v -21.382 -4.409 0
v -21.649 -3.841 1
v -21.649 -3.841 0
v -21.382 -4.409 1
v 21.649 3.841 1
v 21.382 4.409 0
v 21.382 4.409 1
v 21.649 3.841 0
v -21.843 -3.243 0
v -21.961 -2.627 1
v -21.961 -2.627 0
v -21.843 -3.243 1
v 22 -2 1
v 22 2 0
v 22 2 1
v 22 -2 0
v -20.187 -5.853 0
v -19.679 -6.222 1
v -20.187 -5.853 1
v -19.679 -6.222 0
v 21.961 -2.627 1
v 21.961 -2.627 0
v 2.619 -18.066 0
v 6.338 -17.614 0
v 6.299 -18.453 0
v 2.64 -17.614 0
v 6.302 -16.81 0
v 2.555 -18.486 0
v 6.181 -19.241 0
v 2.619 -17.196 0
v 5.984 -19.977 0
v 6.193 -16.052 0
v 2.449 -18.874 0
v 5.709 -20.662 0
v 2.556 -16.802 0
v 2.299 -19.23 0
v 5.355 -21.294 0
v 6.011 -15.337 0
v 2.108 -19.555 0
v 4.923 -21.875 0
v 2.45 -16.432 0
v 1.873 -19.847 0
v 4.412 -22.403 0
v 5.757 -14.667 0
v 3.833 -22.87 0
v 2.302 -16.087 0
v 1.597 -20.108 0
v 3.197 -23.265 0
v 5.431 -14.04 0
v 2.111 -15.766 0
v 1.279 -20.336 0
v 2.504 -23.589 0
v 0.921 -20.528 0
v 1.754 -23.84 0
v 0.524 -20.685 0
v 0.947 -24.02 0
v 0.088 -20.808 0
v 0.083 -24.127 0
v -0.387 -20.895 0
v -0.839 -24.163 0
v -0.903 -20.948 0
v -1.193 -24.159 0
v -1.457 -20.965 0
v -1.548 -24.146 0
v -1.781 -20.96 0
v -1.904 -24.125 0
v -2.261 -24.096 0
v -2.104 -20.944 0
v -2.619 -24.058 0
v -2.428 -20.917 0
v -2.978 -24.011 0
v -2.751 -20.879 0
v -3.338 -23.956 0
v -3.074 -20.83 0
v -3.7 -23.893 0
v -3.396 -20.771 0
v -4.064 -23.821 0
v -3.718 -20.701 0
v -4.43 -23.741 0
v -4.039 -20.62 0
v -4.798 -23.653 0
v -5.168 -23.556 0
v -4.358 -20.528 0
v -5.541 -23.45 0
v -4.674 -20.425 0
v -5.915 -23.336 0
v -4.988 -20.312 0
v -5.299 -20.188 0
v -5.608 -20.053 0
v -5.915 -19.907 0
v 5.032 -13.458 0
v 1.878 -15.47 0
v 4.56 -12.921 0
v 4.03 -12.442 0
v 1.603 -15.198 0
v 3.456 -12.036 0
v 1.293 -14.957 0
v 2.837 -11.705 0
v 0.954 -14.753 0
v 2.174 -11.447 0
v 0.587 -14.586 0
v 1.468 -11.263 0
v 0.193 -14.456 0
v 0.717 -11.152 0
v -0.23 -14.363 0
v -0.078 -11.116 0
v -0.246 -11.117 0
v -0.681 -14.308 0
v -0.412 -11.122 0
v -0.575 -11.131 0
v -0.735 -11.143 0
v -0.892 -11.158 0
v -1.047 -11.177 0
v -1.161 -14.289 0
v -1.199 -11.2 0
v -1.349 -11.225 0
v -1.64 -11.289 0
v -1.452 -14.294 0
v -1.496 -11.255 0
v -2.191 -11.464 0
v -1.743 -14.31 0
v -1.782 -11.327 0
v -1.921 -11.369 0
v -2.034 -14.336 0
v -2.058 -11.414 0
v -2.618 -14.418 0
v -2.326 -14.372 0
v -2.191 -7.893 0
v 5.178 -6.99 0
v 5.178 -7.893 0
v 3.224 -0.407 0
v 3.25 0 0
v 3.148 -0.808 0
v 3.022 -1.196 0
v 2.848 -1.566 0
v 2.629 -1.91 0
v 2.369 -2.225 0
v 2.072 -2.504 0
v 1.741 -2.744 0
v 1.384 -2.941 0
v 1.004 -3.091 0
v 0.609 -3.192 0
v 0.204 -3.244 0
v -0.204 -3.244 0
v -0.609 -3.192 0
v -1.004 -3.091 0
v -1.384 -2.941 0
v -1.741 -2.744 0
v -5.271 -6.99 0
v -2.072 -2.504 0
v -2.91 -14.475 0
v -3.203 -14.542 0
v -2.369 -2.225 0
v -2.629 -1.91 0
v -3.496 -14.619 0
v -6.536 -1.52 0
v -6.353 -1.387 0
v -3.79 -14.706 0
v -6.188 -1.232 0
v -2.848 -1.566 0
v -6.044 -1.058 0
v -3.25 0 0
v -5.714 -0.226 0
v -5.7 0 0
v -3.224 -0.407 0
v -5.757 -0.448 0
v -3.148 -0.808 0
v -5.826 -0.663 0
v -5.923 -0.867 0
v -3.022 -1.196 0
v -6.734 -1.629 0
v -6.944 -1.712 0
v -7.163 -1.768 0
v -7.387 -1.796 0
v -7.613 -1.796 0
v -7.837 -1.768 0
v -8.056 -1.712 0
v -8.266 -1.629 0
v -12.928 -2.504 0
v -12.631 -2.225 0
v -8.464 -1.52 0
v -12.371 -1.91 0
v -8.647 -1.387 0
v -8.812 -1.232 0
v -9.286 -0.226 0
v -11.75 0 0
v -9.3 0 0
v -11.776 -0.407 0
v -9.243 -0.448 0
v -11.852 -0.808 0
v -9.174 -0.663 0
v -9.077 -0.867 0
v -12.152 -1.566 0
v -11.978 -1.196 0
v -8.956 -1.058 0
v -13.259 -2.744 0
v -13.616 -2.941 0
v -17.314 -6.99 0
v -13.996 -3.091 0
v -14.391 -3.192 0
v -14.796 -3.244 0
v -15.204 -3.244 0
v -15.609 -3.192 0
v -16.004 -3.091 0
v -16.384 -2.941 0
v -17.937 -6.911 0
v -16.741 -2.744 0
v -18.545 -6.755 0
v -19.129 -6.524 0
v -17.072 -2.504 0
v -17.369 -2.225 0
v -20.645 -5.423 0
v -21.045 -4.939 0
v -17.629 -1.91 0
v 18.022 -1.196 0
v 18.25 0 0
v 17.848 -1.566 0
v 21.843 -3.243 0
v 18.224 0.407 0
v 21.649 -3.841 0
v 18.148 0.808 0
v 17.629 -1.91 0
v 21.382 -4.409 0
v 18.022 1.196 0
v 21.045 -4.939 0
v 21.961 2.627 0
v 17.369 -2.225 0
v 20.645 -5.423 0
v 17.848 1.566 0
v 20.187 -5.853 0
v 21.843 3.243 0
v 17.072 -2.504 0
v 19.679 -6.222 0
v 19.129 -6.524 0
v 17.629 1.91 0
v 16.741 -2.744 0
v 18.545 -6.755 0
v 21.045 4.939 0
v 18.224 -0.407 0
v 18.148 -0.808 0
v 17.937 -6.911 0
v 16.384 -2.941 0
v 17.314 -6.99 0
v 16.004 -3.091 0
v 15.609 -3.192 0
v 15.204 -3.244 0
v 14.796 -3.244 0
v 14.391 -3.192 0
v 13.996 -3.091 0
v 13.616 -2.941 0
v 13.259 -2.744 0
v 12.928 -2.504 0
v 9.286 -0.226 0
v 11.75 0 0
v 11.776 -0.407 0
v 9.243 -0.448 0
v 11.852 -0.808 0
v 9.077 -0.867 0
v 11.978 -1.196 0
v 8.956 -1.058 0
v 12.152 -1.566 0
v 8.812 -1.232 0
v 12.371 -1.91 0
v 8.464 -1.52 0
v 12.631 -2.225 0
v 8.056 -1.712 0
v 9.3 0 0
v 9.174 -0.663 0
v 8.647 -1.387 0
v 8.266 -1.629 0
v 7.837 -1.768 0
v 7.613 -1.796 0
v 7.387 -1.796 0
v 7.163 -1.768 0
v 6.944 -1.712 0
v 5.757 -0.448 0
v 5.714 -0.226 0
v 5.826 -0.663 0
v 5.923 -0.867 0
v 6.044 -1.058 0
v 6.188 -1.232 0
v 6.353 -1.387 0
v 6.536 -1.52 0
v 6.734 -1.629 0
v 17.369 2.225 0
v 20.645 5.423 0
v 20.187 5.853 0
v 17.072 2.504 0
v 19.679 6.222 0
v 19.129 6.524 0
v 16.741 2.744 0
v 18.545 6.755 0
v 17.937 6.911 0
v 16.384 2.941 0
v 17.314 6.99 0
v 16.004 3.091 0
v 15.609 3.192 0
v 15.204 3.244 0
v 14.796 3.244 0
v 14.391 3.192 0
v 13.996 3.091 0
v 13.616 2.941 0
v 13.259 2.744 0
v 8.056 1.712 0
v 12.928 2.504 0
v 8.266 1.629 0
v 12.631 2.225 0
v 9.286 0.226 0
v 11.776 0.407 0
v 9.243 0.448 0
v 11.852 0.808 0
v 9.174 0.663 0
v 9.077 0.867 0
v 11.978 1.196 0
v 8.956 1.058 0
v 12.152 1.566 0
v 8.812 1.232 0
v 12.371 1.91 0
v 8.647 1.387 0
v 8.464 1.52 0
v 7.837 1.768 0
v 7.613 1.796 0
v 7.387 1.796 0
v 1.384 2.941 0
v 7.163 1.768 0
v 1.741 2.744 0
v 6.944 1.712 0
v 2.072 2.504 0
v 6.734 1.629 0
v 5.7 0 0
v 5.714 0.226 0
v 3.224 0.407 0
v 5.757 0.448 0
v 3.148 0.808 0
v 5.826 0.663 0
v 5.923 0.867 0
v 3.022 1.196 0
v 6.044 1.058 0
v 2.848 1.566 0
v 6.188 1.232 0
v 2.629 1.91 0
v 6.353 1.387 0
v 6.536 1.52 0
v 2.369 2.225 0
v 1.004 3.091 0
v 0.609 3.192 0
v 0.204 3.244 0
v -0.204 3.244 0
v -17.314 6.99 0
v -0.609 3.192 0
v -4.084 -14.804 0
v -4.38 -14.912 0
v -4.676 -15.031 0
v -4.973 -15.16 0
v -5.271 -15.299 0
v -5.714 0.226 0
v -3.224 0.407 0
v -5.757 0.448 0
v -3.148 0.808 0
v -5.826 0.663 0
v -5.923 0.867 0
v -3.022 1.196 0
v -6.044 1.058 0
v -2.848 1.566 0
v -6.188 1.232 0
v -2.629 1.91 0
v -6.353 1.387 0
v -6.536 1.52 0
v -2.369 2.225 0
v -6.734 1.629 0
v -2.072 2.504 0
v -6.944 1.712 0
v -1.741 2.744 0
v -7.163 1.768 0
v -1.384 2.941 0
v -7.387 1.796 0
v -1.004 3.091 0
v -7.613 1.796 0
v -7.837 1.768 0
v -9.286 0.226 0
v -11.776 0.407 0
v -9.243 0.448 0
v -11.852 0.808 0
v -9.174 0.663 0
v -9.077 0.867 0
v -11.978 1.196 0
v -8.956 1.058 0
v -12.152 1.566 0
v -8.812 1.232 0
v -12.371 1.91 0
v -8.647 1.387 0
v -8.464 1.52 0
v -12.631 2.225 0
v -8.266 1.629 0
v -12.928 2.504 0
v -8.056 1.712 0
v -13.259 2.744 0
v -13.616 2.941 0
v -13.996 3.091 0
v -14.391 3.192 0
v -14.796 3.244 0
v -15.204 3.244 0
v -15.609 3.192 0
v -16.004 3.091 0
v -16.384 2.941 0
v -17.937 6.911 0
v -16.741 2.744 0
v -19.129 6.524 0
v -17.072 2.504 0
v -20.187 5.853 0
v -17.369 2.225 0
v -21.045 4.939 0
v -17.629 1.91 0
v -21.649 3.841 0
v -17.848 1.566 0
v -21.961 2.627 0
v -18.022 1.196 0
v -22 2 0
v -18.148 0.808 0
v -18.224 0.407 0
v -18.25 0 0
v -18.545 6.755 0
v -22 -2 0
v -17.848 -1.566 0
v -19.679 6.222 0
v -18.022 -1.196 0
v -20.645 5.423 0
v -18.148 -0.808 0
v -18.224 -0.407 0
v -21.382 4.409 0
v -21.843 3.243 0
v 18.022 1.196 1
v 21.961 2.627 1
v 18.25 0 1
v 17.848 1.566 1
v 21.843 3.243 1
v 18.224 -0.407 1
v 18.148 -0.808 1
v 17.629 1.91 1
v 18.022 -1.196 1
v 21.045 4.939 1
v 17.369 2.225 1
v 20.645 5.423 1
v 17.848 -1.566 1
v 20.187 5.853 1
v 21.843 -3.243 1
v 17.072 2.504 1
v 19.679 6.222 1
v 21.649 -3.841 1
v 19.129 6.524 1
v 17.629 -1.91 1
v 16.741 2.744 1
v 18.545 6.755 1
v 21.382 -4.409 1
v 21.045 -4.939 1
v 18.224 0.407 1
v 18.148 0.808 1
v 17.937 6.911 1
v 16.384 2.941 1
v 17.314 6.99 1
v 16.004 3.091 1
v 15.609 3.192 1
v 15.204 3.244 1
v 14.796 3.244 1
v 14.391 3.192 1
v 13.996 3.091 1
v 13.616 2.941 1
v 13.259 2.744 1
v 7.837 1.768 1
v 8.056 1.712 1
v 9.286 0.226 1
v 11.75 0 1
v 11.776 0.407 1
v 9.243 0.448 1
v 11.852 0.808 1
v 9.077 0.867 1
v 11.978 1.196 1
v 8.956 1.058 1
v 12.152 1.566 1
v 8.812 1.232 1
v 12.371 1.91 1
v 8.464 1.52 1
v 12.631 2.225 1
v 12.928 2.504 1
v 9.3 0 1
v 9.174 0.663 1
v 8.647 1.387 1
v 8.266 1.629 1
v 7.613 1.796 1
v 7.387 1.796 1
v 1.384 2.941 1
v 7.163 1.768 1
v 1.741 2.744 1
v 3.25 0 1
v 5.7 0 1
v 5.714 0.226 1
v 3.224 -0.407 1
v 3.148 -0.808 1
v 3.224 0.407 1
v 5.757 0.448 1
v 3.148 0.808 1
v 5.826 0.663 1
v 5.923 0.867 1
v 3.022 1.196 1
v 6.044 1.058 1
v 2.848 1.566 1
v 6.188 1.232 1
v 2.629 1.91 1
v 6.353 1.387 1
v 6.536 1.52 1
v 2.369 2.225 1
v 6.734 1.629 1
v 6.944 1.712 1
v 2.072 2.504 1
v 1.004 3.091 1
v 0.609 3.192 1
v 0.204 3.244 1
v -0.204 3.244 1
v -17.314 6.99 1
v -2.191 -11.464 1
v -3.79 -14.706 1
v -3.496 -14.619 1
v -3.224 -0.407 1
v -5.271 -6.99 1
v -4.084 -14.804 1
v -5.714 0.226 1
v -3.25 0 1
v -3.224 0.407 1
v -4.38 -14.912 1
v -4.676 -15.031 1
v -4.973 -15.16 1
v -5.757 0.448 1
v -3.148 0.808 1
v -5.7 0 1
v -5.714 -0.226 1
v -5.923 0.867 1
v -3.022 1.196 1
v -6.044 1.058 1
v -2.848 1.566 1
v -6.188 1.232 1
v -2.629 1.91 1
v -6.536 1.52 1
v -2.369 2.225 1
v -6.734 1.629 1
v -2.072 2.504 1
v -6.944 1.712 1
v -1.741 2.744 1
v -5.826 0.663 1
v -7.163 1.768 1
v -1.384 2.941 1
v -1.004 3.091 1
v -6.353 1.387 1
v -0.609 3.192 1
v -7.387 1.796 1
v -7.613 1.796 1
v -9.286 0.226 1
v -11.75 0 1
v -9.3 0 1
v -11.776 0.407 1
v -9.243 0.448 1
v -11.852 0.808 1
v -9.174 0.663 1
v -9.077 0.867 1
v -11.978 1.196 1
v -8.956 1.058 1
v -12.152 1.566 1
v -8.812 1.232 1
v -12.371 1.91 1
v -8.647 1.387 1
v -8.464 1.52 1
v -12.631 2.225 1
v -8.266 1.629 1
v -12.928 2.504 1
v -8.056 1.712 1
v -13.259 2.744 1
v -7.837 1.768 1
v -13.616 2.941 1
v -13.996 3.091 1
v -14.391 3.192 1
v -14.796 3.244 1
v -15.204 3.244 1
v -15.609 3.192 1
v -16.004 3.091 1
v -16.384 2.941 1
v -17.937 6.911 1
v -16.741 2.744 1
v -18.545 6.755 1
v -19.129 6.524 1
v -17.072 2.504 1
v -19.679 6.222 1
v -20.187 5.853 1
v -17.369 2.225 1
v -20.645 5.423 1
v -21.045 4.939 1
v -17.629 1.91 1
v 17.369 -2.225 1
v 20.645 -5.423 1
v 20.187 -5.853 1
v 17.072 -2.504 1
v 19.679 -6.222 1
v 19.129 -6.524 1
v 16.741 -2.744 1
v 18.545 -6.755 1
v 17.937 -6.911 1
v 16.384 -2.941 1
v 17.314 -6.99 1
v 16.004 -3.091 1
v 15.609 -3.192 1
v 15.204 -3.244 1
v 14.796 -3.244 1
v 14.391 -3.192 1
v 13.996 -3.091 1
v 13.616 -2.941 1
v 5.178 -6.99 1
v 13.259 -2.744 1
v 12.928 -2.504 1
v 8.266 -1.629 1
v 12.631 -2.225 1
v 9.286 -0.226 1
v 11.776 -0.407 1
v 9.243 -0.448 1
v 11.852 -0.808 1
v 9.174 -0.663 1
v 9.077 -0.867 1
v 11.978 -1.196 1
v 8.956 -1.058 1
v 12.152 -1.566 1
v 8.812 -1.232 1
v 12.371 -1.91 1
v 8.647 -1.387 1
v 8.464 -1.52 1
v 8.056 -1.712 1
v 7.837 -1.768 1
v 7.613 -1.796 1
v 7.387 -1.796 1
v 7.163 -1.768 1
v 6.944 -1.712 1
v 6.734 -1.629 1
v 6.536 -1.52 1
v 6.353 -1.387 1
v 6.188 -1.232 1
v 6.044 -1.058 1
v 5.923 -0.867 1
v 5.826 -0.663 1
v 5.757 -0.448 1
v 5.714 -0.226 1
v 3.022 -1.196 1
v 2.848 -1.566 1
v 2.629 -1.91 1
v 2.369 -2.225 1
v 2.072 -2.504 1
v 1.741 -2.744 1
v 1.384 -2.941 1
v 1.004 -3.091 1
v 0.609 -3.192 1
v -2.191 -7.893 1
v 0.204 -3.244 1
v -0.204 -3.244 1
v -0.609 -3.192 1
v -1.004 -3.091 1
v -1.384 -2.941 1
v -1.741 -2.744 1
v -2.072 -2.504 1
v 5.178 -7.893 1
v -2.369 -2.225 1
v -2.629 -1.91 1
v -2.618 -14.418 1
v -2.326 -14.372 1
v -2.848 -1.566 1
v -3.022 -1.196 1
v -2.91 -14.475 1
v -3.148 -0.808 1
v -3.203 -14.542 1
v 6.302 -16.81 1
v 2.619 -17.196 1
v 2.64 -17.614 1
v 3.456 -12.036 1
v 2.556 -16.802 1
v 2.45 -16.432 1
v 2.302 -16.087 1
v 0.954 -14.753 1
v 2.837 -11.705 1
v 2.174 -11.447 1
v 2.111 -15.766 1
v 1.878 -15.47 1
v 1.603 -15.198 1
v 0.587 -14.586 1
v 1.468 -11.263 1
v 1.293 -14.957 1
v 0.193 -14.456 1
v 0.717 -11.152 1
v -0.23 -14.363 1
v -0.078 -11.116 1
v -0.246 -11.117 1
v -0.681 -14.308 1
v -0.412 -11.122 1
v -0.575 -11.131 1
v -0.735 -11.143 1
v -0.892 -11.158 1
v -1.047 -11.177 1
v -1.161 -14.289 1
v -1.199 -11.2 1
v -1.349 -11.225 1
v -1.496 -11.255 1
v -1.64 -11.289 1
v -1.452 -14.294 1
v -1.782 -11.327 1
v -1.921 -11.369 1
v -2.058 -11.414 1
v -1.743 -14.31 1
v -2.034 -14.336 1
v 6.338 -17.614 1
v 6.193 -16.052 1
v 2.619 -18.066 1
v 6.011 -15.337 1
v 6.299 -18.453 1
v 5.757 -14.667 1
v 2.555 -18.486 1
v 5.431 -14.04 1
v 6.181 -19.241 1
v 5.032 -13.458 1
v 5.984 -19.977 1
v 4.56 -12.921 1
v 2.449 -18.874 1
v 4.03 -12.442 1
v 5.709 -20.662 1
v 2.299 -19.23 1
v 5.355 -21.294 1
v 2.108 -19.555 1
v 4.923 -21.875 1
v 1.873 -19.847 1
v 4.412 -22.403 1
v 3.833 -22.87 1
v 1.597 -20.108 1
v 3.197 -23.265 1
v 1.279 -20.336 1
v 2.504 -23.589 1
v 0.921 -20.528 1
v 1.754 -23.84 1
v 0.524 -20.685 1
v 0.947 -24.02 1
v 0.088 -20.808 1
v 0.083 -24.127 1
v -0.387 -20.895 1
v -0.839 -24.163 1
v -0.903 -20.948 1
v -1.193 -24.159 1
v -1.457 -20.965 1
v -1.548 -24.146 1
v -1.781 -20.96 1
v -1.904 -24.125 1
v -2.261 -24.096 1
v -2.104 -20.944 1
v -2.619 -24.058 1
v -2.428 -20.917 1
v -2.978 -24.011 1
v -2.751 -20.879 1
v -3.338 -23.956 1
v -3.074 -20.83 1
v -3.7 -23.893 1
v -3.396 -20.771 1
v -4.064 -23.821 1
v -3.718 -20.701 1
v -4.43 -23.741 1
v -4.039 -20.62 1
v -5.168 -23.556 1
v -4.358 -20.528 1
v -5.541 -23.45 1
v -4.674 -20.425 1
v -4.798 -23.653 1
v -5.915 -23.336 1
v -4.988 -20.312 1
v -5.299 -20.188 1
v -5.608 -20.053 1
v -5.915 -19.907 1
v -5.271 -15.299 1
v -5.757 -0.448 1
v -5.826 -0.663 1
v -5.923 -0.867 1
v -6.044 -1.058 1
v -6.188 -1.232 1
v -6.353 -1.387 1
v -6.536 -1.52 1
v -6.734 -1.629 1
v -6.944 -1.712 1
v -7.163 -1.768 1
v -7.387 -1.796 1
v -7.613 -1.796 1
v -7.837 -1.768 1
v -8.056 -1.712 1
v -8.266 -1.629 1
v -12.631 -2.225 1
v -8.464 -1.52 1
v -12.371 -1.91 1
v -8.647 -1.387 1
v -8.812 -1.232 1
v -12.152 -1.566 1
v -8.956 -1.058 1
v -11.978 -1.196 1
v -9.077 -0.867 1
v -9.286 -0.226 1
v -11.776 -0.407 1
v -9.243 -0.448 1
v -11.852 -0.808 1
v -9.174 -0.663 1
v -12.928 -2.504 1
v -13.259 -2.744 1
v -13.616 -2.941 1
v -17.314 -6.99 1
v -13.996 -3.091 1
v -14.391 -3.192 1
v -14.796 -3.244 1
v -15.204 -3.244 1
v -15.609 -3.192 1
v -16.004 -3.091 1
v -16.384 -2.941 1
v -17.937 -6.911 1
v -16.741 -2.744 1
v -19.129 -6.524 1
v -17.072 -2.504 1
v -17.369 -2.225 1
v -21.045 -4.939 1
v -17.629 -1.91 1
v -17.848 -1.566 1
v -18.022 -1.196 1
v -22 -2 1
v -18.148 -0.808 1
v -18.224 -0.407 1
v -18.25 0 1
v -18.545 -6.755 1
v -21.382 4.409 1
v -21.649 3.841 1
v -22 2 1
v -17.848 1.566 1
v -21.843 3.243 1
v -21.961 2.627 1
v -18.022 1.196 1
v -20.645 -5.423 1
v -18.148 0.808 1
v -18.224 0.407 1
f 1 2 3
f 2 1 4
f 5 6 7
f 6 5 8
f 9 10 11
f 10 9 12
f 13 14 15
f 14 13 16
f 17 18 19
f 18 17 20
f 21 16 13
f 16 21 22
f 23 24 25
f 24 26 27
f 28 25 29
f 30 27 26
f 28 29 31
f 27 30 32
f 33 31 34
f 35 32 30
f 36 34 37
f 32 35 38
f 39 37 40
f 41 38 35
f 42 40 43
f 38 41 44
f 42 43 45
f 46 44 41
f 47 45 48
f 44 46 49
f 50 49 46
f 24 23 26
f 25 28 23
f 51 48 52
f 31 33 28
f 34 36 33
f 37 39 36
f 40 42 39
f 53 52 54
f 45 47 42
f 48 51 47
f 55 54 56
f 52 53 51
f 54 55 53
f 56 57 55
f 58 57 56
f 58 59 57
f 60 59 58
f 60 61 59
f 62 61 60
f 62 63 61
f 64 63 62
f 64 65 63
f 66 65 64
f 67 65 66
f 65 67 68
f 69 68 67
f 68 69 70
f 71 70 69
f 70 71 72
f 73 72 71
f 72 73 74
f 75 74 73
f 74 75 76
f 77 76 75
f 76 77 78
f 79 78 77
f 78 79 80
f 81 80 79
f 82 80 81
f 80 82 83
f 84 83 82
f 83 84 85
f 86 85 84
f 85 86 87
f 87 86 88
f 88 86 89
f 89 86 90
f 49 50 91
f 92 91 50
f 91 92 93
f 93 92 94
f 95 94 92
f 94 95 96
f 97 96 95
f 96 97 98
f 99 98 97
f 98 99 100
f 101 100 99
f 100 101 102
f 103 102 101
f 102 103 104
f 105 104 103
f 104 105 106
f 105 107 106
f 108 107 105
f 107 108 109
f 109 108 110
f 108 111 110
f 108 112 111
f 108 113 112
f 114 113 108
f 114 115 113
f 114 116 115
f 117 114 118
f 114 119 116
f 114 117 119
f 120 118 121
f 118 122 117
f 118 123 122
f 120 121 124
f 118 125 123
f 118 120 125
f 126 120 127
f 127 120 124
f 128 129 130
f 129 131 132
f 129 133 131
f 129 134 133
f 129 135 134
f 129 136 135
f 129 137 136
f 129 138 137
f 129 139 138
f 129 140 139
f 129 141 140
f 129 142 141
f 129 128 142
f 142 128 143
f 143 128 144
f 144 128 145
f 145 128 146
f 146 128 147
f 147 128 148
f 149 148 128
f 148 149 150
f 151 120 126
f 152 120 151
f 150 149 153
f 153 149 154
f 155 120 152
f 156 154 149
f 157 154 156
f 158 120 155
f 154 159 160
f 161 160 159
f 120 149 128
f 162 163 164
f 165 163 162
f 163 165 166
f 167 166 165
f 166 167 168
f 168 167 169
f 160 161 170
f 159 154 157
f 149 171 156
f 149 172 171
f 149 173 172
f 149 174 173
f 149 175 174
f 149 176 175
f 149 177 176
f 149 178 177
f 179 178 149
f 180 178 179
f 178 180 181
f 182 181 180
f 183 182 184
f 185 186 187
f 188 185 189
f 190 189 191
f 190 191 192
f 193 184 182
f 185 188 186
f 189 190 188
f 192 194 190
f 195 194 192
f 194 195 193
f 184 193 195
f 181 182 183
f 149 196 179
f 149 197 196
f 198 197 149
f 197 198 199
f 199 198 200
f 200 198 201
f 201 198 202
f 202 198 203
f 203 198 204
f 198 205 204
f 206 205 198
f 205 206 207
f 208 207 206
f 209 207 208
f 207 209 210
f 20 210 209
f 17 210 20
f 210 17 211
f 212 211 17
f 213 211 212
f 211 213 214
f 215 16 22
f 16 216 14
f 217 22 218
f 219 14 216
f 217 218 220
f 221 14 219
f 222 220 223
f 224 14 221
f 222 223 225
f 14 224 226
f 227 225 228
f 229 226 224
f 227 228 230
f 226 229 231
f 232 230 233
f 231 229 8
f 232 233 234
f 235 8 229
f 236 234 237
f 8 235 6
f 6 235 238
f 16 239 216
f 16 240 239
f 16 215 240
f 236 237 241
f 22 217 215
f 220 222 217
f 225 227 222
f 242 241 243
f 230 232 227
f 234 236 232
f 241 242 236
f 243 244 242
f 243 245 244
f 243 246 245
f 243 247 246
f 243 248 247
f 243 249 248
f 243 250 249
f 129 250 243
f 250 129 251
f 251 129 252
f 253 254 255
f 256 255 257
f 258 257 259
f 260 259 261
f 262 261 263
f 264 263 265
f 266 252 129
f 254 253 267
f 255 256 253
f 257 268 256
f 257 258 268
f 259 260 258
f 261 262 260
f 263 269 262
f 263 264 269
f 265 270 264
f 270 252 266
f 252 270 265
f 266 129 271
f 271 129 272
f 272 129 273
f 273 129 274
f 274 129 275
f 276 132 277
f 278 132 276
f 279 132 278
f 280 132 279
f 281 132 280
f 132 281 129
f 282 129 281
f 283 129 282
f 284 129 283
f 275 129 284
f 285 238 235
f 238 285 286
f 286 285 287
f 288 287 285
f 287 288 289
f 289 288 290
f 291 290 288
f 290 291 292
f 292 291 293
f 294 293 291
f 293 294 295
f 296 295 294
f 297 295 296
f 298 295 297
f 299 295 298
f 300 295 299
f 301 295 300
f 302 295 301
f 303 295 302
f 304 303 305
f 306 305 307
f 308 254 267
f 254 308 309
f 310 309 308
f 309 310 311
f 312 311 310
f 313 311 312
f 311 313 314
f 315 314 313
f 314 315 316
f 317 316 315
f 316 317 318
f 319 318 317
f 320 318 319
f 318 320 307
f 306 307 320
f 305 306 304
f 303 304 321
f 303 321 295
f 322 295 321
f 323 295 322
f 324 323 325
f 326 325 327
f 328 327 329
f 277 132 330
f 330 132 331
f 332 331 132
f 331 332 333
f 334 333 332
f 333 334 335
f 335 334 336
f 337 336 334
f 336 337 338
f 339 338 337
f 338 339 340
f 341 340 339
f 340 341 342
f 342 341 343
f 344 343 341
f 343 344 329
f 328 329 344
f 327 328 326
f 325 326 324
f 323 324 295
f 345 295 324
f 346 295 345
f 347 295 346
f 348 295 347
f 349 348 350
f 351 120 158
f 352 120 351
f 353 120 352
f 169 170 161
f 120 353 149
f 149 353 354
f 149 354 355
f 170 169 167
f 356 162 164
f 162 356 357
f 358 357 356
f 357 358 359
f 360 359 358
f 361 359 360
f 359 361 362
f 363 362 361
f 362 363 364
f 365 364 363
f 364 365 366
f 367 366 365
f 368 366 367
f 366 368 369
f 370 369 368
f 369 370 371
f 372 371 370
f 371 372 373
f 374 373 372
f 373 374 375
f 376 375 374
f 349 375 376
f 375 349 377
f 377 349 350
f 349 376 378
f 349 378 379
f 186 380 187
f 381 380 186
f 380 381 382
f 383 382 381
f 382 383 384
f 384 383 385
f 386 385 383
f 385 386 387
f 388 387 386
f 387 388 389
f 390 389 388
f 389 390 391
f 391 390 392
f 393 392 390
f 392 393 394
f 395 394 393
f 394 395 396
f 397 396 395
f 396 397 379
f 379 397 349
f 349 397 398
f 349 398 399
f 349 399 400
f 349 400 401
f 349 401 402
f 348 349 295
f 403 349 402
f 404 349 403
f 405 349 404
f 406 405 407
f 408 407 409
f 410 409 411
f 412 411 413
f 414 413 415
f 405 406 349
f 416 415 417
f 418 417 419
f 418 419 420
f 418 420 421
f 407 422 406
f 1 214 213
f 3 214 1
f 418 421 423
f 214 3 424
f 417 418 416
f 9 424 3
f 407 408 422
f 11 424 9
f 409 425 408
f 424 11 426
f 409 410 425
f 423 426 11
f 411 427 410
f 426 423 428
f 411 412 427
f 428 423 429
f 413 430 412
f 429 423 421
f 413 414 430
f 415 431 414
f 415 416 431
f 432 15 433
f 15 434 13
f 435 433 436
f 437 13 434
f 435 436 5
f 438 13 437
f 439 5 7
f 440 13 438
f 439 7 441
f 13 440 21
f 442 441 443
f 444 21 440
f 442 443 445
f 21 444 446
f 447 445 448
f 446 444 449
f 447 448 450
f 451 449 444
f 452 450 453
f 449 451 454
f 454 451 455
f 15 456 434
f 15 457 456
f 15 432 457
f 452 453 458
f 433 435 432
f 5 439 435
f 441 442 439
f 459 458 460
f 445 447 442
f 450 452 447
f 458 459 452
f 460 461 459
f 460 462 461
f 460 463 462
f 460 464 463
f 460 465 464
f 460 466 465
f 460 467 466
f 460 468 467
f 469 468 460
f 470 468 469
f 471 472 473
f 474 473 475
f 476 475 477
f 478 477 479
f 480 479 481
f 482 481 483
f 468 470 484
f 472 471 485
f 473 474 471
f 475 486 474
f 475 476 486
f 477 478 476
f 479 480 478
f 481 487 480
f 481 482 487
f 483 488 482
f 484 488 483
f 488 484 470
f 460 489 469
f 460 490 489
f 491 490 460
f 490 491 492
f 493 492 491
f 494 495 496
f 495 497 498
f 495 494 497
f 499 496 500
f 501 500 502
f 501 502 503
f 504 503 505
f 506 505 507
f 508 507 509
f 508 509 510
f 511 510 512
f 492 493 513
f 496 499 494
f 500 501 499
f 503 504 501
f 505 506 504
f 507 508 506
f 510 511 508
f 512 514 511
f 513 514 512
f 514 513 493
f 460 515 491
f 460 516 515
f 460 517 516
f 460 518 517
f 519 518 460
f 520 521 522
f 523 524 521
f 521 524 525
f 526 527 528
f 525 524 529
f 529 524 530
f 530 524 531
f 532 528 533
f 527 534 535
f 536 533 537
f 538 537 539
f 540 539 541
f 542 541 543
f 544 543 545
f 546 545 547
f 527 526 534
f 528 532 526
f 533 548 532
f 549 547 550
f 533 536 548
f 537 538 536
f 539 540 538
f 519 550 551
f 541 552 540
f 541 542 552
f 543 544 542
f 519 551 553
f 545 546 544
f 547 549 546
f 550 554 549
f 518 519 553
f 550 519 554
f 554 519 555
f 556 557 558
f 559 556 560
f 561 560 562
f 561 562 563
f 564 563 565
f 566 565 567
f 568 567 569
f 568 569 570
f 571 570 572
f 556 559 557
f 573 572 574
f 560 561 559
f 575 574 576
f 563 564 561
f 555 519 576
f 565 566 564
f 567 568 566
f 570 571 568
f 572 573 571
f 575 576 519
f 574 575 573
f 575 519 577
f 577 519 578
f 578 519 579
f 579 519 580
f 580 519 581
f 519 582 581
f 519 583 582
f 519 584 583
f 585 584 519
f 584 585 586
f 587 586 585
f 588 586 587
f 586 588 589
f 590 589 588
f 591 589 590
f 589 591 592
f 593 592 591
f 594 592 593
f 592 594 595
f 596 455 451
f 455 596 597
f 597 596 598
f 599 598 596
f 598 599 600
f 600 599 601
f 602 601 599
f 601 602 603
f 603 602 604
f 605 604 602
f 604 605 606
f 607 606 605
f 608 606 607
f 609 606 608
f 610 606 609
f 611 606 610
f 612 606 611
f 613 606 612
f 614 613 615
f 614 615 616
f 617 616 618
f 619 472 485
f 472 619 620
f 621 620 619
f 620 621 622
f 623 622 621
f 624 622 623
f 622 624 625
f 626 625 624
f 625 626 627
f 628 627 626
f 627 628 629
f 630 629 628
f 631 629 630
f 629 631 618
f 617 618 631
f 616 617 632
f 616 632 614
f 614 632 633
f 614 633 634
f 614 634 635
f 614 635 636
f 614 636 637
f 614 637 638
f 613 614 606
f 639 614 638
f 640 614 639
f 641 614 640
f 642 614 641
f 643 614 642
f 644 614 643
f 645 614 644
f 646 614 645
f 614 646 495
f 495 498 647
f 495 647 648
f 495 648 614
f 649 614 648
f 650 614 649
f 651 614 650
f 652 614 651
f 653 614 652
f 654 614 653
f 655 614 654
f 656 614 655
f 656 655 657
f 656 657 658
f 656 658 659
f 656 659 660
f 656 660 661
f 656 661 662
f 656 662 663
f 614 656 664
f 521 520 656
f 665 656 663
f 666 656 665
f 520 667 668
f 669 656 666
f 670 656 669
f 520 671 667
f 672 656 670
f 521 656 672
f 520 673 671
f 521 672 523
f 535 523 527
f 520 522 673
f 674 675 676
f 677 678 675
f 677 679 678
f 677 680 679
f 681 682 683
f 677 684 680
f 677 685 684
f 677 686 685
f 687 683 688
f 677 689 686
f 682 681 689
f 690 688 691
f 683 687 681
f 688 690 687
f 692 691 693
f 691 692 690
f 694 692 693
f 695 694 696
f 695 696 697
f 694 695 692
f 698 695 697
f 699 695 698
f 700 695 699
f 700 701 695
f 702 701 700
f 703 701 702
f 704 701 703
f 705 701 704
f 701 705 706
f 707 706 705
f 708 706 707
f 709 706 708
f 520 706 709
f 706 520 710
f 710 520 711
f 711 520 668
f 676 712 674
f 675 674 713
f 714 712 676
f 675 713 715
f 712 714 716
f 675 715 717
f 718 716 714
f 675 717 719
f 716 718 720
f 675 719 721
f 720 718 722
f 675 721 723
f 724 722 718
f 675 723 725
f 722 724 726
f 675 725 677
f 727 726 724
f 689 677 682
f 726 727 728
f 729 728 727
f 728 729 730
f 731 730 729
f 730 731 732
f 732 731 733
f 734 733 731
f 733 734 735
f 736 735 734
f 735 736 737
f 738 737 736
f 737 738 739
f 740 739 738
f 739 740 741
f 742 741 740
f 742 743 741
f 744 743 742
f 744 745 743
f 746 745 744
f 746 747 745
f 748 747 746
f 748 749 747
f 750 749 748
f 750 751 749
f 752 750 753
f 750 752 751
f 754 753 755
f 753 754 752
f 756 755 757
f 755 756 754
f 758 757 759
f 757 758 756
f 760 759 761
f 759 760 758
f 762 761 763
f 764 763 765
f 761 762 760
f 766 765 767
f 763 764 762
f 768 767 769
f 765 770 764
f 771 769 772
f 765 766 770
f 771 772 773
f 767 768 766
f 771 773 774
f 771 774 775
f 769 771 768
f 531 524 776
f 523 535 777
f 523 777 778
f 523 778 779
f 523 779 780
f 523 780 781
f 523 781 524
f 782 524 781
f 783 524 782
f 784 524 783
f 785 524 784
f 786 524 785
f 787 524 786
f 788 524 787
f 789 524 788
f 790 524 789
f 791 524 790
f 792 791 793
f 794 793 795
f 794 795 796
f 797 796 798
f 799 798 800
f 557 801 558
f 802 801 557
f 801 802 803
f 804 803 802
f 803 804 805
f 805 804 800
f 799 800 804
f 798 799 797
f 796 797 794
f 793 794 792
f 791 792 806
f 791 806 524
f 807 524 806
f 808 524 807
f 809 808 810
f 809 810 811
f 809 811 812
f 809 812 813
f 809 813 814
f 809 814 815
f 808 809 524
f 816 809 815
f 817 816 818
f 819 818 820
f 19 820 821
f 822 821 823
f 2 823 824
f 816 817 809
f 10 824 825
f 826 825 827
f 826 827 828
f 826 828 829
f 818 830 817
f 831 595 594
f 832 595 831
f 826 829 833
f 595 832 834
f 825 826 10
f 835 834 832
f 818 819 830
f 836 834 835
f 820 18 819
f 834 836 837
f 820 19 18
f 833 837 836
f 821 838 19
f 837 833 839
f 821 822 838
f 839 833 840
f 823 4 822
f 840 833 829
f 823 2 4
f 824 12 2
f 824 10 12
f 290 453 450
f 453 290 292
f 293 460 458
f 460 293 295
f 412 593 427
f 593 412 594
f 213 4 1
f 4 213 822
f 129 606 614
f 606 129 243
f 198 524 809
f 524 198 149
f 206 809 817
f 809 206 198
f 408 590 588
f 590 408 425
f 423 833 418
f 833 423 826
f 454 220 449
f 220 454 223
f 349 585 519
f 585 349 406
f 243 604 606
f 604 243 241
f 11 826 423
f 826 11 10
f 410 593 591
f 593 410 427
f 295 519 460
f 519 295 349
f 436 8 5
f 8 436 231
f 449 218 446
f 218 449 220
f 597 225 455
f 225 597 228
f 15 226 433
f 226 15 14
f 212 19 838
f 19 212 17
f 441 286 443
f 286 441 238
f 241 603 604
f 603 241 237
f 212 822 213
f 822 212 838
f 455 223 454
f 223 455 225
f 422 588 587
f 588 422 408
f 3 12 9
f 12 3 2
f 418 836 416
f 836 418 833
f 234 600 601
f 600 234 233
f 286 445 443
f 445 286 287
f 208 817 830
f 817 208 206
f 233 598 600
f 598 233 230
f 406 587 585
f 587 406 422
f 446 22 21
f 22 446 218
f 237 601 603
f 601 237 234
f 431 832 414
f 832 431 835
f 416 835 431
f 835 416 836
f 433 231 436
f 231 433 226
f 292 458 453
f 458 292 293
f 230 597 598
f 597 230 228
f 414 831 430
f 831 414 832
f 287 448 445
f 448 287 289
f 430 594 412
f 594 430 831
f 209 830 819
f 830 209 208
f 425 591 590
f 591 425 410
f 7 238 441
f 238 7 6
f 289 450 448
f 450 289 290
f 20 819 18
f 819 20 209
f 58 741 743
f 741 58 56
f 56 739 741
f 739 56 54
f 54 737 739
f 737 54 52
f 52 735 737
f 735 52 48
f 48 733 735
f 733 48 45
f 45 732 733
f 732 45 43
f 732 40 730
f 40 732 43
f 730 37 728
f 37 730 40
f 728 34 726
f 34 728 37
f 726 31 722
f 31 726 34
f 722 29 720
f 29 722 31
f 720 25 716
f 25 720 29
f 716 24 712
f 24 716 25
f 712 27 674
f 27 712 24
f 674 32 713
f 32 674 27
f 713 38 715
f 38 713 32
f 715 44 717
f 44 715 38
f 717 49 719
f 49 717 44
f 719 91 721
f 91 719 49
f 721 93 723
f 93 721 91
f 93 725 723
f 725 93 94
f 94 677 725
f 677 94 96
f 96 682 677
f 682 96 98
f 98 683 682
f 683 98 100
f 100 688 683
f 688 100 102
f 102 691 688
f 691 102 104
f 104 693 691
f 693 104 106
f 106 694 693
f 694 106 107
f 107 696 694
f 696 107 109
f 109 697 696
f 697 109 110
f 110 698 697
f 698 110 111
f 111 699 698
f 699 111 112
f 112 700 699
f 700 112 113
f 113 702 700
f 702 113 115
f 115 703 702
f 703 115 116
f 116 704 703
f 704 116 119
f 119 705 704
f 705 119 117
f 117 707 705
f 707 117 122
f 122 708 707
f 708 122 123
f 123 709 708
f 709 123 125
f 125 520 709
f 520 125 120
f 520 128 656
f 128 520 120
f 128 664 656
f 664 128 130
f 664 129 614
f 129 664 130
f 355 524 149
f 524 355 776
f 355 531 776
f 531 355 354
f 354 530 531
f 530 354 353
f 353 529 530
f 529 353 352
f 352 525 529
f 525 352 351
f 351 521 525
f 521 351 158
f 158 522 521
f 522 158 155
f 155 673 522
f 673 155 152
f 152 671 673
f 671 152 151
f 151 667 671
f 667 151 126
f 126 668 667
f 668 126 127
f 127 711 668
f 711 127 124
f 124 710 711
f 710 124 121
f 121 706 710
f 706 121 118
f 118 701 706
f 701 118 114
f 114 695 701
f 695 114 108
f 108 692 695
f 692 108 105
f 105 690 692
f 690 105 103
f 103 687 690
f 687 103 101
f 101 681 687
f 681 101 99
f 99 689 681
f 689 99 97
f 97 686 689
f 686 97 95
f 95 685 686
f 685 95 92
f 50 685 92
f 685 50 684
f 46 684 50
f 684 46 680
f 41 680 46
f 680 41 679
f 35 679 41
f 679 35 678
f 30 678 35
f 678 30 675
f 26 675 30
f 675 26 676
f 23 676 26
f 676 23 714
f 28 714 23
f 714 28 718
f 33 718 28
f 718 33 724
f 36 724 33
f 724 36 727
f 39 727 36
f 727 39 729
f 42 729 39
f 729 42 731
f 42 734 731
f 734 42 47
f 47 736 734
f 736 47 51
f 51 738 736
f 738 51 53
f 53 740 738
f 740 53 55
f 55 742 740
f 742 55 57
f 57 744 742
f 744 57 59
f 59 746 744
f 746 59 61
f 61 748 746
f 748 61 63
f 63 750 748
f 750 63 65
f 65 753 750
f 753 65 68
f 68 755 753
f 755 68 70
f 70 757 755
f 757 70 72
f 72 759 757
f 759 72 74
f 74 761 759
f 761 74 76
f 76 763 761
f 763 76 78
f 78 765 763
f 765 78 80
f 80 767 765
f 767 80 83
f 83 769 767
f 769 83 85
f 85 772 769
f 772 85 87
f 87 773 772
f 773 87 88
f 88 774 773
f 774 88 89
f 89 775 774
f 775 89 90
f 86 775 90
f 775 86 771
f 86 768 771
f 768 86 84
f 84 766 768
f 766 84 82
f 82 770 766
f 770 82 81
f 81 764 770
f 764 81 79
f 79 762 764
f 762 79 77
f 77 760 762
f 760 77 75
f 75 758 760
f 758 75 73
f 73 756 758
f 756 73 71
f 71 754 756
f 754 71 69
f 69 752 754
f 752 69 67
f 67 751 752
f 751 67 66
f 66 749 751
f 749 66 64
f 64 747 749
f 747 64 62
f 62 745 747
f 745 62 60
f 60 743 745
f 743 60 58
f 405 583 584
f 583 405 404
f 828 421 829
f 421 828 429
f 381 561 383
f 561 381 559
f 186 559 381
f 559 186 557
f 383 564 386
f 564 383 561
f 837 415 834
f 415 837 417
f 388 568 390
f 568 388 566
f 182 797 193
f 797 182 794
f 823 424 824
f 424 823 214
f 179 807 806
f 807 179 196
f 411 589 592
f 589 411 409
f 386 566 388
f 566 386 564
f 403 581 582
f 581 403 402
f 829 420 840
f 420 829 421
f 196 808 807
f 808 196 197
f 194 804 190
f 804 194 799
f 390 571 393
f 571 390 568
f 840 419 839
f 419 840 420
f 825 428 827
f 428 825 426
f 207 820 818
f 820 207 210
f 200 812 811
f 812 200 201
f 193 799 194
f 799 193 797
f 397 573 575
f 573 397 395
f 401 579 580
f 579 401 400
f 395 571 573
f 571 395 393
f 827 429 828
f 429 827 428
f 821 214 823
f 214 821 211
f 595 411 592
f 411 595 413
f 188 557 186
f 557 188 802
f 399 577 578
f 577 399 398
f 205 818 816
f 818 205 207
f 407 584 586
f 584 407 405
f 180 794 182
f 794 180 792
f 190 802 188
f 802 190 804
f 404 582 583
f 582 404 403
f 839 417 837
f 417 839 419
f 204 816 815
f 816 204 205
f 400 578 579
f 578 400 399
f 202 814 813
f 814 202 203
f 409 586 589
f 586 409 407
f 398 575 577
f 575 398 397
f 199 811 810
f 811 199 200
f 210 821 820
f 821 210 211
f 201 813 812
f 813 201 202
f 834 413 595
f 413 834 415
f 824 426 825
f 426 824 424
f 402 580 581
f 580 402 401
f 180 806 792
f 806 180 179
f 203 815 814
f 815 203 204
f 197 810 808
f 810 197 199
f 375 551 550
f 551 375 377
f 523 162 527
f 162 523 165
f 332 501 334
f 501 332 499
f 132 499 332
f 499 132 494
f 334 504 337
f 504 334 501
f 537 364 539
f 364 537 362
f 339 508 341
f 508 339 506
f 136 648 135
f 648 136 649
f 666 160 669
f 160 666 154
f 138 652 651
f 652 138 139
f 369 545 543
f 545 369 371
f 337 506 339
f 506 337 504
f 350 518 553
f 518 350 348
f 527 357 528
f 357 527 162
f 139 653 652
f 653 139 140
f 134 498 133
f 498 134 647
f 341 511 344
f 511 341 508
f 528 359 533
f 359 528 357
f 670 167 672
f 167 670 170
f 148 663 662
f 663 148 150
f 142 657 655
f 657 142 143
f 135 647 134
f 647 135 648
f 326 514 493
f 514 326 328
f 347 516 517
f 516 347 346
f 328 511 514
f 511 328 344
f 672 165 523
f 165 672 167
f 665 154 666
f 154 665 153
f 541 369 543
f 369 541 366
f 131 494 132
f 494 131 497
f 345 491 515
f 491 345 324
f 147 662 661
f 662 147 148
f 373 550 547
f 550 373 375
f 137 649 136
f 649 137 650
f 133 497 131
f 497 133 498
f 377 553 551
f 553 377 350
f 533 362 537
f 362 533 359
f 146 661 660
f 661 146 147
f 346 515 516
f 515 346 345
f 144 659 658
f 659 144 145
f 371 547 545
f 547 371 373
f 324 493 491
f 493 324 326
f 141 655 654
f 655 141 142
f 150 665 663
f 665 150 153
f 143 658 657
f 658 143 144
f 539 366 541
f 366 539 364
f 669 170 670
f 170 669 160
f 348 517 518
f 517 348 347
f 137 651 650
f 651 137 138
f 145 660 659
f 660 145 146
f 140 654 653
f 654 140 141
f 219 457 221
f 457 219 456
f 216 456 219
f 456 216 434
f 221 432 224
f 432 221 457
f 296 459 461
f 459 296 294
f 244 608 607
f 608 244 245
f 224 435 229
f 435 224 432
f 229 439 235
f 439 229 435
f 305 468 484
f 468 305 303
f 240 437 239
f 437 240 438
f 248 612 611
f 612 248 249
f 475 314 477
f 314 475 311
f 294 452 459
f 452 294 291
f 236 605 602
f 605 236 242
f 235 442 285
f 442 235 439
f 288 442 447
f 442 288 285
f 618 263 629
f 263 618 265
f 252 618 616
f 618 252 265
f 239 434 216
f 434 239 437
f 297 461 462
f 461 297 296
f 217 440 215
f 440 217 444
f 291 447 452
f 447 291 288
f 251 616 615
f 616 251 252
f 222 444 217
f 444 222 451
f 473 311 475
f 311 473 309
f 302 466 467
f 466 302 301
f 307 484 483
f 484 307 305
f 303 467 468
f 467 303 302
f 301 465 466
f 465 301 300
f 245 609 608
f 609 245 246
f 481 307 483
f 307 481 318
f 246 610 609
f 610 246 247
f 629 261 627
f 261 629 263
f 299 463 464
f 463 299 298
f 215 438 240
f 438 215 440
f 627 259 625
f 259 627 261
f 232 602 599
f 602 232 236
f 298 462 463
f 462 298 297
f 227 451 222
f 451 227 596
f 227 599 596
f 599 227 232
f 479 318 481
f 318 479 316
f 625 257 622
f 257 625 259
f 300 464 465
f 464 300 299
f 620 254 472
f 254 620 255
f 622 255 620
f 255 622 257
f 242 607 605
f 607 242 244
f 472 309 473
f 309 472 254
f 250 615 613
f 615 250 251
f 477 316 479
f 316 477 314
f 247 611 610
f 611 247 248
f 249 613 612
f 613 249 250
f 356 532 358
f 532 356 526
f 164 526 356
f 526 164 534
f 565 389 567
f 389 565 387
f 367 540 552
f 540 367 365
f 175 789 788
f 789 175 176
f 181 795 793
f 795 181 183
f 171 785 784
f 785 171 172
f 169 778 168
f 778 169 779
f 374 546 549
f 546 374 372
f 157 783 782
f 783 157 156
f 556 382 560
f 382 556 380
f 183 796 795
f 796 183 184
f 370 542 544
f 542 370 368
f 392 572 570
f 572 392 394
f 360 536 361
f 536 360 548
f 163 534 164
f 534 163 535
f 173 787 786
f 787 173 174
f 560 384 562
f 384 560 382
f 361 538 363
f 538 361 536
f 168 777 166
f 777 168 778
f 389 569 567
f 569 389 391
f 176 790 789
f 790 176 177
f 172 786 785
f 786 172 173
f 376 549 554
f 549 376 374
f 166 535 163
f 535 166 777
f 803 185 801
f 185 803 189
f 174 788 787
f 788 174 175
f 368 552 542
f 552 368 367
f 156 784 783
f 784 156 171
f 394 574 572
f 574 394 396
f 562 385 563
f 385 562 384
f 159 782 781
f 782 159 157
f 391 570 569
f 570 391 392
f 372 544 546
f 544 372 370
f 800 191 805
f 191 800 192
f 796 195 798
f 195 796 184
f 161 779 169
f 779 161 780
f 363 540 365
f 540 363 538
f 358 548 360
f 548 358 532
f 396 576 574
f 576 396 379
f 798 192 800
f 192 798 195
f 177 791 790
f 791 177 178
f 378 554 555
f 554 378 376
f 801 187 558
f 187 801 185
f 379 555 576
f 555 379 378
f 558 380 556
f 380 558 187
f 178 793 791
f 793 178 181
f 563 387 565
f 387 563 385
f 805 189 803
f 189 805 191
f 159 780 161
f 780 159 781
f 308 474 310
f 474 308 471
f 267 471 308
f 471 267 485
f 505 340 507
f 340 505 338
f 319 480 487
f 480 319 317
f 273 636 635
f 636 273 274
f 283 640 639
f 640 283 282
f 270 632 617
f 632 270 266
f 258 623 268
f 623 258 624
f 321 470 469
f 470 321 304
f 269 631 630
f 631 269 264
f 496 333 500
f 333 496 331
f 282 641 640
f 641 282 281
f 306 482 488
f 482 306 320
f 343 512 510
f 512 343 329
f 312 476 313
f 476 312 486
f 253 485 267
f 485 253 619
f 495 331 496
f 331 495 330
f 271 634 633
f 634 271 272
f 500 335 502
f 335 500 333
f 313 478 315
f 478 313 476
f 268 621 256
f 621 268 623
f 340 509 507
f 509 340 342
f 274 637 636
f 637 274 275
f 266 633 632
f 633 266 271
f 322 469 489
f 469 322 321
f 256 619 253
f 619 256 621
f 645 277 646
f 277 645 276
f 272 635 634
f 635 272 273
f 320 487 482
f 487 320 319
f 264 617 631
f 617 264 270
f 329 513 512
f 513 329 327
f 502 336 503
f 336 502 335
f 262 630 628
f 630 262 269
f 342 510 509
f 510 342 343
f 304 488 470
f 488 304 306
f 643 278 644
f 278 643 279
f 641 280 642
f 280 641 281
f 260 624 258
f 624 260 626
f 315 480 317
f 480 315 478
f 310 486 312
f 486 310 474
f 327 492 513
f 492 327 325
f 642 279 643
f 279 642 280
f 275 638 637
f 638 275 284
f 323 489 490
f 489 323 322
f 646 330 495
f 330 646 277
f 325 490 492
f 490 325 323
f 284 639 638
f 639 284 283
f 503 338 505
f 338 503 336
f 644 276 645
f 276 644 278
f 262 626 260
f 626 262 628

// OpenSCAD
$fn = 50;


difference() {
	union() {
		*color(alpha = 1.0000000000, c = "gray") {
			translate(v = [0, 14, 0]) {
				linear_extrude(height = 1) {
					text(font = "Arial:style=Bold", halign = "center", size = 4.5000000000, text = "COMMENT description oobb_plate_shape_p_type_1_depth_3_width_1_thickness_5_extra_oobb_size", valign = "center");
				}
			}
		}
		hull() {
			translate(v = [-17.0000000000, 2.0000000000, 0]) {
				cylinder(h = 1, r = 5);
			}
			translate(v = [17.0000000000, 2.0000000000, 0]) {
				cylinder(h = 1, r = 5);
			}
			translate(v = [-17.0000000000, -2.0000000000, 0]) {
				cylinder(h = 1, r = 5);
			}
			translate(v = [17.0000000000, -2.0000000000, 0]) {
				cylinder(h = 1, r = 5);
			}
		}
		translate(v = [0, -5, 0]) {
			linear_extrude(height = 1) {
				text(font = "DejaVu Sans Mono:style=Bold", halign = "center", size = 19.0000000000, text = "5", valign = "top");
			}
		}
	}
	union() {
		*color(alpha = 1.0000000000, c = "gray") {
			translate(v = [0, 14, 0]) {
				linear_extrude(height = 1) {
					text(font = "Arial:style=Bold", halign = "center", size = 4.5000000000, text = "COMMENT description oobb_holes_shape_n_type_3_width_1_thickness_5_extra_oobb_size_1_height_'all'_holes_true_both_holes", valign = "center");
				}
			}
		}
		translate(v = [-15.0000000000, 0.0000000000, 0]) {
			translate(v = [0, 0, -50]) {
				cylinder(h = 100, r = 3.2500000000);
			}
		}
		translate(v = [0, 0, -50]) {
			cylinder(h = 100, r = 3.2500000000);
		}
		translate(v = [15.0000000000, 0.0000000000, 0]) {
			translate(v = [0, 0, -50]) {
				cylinder(h = 100, r = 3.2500000000);
			}
		}
		translate(v = [-15.0000000000, 0.0000000000, 0]) {
			translate(v = [0, 0, -50]) {
				cylinder(h = 100, r = 1.8000000000);
			}
		}
		translate(v = [-7.5000000000, 0.0000000000, 0]) {
			translate(v = [0, 0, -50]) {
				cylinder(h = 100, r = 1.8000000000);
			}
		}
		translate(v = [0, 0, -50]) {
			cylinder(h = 100, r = 1.8000000000);
		}
		translate(v = [7.5000000000, 0.0000000000, 0]) {
			translate(v = [0, 0, -50]) {
				cylinder(h = 100, r = 1.8000000000);
			}
		}
		translate(v = [15.0000000000, 0.0000000000, 0]) {
			translate(v = [0, 0, -50]) {
				cylinder(h = 100, r = 1.8000000000);
			}
		}
	}
}
